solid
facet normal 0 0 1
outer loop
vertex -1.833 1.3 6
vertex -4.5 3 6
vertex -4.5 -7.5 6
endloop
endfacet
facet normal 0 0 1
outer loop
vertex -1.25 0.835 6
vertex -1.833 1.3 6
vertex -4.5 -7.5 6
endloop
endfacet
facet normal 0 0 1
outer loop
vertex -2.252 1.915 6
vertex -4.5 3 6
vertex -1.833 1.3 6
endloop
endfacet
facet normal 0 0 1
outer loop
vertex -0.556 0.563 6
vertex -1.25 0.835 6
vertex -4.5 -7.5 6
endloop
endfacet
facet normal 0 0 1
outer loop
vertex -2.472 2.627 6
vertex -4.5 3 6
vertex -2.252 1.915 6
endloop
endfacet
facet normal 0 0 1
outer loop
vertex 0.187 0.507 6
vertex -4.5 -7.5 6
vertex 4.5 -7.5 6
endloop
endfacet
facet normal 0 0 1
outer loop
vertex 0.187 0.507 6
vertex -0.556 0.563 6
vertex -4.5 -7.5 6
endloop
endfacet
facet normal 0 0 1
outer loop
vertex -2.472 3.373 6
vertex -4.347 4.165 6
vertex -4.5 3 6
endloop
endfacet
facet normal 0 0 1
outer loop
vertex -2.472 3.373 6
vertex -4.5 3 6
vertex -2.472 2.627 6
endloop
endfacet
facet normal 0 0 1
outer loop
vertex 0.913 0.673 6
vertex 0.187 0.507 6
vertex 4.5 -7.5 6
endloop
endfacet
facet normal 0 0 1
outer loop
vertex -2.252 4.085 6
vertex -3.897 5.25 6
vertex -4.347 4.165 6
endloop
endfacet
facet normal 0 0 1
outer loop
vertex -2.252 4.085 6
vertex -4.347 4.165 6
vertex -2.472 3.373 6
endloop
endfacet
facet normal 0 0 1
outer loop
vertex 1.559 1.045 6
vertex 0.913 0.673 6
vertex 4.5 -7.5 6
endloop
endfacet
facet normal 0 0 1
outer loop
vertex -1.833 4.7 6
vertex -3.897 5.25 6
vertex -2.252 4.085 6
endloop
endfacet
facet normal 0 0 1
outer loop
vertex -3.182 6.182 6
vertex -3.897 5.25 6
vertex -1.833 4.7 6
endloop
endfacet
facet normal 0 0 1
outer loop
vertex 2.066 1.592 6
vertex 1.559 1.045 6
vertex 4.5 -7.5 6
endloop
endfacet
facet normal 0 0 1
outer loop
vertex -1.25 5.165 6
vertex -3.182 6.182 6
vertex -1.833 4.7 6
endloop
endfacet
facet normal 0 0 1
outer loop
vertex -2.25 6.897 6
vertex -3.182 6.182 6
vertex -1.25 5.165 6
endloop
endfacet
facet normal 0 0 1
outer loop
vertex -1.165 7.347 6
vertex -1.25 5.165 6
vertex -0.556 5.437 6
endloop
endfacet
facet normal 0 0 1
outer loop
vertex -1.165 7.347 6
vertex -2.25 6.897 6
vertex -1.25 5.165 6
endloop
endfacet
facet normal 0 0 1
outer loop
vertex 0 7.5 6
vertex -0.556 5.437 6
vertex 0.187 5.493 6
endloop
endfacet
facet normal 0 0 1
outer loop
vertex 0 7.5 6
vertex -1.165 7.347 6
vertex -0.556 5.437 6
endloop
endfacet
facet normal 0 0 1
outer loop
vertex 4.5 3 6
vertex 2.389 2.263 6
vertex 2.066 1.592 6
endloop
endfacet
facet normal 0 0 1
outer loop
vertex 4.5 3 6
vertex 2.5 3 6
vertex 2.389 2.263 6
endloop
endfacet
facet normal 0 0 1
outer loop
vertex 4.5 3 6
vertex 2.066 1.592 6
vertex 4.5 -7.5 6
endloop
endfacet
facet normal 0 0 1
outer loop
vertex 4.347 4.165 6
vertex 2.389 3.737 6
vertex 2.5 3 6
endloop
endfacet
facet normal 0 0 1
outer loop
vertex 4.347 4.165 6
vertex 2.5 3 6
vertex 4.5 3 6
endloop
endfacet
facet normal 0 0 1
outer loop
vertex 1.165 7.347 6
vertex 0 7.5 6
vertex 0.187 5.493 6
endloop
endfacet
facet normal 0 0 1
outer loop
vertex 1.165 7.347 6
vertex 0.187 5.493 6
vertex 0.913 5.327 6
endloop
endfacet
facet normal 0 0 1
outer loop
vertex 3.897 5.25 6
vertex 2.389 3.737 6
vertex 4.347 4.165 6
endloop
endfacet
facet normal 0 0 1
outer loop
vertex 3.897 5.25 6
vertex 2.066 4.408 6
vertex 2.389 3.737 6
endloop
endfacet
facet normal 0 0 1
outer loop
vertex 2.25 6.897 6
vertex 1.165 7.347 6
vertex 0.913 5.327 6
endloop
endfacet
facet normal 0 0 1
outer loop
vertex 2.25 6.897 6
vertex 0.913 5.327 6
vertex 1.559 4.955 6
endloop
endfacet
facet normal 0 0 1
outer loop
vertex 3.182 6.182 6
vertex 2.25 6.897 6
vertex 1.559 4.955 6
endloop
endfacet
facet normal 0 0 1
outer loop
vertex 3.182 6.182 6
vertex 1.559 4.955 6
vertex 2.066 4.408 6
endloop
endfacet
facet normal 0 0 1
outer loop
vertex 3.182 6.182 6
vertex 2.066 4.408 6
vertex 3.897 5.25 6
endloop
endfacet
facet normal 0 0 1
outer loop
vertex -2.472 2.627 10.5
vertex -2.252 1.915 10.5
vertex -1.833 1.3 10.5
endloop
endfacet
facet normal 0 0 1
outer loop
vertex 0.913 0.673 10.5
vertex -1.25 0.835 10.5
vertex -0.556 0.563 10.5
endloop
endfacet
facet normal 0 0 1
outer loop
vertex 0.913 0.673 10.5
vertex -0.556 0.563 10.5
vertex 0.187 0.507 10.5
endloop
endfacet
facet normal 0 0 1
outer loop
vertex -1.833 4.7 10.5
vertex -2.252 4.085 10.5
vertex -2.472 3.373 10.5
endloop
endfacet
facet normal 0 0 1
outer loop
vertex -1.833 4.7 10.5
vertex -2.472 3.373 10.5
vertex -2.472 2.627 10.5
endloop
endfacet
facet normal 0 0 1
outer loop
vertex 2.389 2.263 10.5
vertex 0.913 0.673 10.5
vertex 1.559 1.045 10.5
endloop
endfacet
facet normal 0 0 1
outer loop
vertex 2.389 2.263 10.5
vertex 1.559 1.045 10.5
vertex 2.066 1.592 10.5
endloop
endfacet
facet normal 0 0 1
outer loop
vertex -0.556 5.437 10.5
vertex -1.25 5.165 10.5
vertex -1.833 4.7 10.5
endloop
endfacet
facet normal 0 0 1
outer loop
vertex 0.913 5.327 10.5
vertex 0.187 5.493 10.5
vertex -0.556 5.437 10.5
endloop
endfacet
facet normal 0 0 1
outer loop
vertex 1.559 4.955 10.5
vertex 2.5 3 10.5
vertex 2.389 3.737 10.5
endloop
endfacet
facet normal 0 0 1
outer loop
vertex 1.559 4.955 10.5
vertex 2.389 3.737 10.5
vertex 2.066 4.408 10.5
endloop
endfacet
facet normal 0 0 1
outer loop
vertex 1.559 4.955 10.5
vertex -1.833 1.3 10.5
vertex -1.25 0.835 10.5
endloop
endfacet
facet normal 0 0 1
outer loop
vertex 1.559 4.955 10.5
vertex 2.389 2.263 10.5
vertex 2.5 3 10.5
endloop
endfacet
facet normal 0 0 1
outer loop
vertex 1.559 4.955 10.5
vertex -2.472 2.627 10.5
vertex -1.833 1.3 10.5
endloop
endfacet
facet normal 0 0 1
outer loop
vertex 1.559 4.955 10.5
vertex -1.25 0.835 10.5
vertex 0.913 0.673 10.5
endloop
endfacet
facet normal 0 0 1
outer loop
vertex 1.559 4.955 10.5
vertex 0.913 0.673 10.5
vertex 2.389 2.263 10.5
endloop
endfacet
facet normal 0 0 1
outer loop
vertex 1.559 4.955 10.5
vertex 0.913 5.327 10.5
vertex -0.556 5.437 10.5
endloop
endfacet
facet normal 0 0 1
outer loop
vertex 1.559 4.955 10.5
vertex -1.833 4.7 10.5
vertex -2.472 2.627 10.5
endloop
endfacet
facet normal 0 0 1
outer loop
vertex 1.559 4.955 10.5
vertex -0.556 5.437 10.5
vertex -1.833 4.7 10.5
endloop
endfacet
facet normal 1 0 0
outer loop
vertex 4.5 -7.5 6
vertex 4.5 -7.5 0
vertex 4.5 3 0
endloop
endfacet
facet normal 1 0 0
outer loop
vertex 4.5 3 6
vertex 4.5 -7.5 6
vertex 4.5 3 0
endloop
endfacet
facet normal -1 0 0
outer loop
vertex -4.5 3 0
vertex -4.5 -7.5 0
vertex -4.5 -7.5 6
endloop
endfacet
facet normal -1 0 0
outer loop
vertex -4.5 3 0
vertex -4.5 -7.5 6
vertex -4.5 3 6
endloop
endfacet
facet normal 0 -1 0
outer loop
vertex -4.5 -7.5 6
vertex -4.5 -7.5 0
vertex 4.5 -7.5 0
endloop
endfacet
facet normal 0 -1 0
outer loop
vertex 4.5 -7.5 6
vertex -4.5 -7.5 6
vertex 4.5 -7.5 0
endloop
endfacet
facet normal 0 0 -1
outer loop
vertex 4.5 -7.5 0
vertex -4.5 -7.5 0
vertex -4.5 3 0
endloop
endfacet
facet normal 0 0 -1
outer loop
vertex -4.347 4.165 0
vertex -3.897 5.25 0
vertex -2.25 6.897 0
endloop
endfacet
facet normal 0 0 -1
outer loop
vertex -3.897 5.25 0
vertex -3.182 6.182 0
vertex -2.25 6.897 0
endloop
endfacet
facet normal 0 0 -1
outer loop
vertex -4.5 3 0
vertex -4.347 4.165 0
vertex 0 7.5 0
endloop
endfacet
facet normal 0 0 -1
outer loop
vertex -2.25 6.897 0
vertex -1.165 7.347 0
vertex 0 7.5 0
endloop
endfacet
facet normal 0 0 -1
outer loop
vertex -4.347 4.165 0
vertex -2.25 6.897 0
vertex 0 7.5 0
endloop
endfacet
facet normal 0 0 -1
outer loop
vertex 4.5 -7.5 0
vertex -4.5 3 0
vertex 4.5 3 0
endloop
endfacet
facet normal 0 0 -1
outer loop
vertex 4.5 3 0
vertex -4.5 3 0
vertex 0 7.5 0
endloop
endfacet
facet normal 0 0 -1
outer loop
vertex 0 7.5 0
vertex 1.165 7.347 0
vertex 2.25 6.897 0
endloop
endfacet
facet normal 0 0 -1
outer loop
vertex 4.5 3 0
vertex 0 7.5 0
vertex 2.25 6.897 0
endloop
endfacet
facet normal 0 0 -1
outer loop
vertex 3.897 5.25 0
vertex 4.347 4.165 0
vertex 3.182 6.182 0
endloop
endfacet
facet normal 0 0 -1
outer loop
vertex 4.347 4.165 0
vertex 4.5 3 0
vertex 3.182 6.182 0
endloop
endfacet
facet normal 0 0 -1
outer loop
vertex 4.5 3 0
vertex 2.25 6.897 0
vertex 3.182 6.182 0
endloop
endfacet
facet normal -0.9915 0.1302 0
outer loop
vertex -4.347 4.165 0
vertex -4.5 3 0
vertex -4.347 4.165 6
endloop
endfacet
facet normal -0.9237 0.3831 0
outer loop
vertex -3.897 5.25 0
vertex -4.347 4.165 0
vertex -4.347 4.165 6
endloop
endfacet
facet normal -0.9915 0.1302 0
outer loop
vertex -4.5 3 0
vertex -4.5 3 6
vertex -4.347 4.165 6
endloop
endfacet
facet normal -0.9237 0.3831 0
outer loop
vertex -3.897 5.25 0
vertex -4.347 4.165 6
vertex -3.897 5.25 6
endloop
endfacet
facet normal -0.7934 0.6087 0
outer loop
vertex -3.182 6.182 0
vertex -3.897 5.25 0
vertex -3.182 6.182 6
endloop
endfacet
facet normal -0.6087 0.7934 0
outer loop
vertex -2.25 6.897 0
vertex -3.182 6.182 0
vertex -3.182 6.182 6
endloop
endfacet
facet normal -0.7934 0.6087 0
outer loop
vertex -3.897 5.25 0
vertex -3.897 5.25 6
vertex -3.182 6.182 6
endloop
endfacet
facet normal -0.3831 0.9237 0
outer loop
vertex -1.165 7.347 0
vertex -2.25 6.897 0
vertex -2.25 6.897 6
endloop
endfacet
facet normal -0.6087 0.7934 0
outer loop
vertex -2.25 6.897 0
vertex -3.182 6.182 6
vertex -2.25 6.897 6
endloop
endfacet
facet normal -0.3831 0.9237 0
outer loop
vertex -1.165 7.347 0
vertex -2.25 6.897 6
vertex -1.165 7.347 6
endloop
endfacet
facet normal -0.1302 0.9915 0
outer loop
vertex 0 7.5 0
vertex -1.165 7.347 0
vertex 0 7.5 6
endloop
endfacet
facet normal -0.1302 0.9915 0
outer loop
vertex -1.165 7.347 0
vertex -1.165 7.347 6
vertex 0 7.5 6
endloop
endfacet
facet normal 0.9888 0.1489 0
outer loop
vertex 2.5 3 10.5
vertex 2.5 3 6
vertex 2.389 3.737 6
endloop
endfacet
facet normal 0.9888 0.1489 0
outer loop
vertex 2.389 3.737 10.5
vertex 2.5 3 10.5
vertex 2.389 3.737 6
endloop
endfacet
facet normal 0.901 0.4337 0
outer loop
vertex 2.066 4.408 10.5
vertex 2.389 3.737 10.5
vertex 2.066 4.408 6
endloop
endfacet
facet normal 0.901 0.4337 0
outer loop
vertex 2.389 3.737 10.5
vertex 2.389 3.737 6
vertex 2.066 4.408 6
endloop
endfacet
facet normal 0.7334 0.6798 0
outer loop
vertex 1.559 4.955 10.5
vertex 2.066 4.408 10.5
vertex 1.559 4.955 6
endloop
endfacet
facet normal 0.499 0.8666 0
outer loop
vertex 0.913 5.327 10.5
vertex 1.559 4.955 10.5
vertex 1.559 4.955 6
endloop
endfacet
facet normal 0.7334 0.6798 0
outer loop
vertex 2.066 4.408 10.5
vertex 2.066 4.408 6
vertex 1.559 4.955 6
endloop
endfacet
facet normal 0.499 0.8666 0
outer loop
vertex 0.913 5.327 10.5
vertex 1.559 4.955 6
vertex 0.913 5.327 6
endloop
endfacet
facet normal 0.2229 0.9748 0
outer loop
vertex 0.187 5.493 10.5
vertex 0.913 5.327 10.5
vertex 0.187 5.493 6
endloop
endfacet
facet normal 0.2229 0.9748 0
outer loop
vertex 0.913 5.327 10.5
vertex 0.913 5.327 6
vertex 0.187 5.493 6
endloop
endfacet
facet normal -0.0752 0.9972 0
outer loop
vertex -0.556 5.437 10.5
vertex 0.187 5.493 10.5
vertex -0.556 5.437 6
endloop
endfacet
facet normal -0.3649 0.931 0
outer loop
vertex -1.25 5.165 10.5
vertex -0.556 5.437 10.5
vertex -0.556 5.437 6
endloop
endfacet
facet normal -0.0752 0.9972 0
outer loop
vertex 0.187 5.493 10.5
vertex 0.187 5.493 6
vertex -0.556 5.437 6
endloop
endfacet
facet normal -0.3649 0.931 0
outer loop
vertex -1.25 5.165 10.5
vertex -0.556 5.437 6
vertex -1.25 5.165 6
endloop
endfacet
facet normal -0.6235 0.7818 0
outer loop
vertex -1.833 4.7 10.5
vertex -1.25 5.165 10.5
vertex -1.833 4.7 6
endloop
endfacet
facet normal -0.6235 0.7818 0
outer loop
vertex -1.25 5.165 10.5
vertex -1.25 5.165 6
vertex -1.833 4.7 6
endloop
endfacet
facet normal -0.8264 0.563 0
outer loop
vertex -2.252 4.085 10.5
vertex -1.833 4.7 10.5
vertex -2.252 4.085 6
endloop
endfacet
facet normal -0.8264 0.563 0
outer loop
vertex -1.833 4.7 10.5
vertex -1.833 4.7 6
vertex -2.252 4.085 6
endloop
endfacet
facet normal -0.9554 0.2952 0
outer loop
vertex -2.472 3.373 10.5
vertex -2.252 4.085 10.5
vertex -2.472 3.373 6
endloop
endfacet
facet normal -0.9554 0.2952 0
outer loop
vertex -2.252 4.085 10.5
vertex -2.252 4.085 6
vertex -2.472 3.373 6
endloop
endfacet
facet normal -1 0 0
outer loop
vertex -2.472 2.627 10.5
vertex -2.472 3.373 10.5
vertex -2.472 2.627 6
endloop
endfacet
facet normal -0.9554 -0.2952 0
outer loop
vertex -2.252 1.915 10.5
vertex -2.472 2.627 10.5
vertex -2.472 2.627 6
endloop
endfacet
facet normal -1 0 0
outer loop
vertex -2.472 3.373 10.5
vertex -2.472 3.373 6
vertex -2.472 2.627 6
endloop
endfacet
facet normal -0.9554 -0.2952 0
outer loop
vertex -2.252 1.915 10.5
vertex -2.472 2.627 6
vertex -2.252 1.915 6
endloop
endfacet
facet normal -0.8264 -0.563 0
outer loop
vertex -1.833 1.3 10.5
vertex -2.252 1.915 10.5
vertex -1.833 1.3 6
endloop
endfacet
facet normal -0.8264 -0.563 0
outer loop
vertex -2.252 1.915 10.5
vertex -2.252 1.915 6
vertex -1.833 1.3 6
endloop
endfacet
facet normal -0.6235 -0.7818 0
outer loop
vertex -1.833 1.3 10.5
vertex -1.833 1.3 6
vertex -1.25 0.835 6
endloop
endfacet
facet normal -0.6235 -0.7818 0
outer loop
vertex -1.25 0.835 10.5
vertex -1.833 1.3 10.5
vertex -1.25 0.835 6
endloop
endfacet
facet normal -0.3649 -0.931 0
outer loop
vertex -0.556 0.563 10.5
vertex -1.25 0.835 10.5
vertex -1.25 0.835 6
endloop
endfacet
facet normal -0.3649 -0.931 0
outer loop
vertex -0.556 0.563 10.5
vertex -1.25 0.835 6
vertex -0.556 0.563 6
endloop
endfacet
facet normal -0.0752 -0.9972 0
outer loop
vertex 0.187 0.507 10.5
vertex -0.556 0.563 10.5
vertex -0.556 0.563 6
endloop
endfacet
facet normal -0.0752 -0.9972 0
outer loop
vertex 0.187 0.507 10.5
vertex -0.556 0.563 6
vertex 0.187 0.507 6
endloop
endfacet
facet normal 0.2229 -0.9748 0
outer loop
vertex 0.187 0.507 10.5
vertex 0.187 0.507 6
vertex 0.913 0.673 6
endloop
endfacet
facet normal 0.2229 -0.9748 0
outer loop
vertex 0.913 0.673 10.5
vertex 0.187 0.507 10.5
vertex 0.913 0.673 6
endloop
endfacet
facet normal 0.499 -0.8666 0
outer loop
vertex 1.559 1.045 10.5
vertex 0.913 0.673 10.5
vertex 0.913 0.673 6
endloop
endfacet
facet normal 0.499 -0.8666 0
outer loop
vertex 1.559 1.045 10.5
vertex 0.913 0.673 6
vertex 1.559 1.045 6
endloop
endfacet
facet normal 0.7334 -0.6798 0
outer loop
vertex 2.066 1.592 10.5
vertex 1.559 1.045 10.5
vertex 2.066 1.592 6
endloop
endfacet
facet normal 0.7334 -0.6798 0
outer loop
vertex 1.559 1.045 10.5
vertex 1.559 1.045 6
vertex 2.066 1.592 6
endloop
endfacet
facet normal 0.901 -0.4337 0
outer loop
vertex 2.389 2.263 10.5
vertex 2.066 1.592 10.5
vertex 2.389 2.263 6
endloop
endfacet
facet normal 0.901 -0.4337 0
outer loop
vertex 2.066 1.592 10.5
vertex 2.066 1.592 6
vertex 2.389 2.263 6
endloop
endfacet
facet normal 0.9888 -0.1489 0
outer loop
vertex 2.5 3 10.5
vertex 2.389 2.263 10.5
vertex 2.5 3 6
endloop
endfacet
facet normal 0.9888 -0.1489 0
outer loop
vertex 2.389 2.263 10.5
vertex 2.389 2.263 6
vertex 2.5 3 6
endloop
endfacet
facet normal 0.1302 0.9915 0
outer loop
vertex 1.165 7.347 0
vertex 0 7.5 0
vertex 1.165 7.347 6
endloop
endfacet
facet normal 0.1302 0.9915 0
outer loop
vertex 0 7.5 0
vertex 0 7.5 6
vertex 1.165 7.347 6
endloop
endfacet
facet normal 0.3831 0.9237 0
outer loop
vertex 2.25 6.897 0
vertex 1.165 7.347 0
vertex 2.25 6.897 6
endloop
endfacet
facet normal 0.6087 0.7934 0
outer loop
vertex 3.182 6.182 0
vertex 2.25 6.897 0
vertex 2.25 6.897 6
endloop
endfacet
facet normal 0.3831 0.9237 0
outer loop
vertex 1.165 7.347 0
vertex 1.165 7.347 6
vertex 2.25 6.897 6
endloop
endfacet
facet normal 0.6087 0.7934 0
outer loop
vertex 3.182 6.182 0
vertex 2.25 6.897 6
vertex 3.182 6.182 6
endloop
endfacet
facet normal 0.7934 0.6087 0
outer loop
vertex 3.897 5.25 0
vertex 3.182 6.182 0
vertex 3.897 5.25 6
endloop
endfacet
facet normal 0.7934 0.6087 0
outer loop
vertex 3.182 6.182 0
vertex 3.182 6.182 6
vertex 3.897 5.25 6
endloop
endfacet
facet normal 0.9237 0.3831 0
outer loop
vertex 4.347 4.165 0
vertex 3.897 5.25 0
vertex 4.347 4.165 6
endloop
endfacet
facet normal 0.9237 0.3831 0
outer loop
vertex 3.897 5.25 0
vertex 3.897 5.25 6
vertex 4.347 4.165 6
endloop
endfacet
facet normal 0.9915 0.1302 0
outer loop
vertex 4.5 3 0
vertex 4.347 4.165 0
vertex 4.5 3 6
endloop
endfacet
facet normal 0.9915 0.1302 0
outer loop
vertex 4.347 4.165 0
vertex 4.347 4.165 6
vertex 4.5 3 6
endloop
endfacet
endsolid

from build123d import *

# Parameters (mm, degrees)
F0_W     = 9
F0_H     = 15
F1_DEPTH = 6
F2_R     = 2.5
F3_DEPTH = 4.5
F4_R     = 4.49999


# Not quite as in the source:
# - a fillet or chamfer is up to 0.001 mm smaller than in the source, because OpenCascade refuses the exact size


with BuildPart() as f1:
    # F0 (on Top) → F1 (new body)
    with BuildSketch(Plane.XY):
        Rectangle(F0_W, F0_H)
    extrude(amount=F1_DEPTH)

    # F2 (on face) → F3 (join)
    with BuildSketch(Plane.XY.offset(6)):
        with Locations((0, 3)):
            Circle(F2_R)
    extrude(amount=F3_DEPTH)

    # F4 (radius 4.5 in the source; OpenCascade refuses exactly that, so slightly less here)
    f4_edges = [f1.edges().sort_by_distance(p)[0] for p in [
        (-4.5, 7.5, 3),
        (4.5, 7.5, 3),
    ]]
    fillet(f4_edges, radius=F4_R)


solid = f1.part
